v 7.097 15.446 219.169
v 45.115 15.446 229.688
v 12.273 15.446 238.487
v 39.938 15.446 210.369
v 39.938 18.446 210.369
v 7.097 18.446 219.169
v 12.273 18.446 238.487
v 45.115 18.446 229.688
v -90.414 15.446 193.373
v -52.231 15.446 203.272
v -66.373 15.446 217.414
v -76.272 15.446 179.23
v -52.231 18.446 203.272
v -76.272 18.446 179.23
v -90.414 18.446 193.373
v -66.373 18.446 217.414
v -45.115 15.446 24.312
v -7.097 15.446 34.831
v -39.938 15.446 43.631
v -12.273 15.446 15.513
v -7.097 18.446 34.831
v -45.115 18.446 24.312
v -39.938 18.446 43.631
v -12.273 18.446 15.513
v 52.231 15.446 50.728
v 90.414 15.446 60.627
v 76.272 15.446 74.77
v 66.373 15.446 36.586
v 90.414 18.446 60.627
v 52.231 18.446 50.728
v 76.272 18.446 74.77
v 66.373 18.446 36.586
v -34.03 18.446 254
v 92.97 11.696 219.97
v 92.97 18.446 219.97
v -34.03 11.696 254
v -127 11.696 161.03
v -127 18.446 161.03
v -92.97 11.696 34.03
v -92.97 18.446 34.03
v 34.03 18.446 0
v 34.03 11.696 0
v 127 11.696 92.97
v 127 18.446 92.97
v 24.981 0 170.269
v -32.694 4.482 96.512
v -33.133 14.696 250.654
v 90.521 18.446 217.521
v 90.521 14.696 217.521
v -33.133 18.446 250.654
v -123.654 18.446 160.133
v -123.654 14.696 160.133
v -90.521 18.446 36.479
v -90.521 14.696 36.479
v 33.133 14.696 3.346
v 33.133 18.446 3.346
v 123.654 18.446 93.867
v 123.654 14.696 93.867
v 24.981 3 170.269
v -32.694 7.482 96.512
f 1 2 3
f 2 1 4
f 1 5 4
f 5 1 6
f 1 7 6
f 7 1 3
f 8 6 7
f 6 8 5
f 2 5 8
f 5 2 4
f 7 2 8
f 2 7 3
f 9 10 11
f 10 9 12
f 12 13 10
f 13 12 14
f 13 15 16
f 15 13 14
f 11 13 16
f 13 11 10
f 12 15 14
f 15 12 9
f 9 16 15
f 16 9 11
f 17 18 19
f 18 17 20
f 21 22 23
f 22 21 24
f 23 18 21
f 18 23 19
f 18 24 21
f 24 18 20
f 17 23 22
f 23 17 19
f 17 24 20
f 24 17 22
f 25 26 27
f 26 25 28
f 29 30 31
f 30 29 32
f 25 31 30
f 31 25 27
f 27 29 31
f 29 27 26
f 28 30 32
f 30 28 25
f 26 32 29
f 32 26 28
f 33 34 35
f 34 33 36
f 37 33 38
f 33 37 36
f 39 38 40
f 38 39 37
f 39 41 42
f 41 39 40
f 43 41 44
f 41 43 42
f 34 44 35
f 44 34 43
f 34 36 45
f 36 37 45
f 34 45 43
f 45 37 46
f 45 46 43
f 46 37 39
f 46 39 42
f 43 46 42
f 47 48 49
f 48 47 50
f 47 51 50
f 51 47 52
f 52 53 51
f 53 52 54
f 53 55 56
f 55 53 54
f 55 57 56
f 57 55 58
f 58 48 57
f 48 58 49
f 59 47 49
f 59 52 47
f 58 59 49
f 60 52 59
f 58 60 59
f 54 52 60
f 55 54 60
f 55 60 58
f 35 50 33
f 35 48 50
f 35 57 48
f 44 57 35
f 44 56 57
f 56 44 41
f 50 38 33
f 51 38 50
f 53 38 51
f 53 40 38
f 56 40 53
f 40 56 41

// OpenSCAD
/*
    parametric_faceted_hex_wall_tile_mount_v23_10x10_vertical.scad
    ----------------------------------------------------------------
    Regular asymmetric low-poly hex wall tile.

    v23 goals
    ---------
    1. Exact 10.00" x 10.00" finished face bounding box by default.
    2. Preserve a TRUE regular hexagon -- no X/Y stretching.
    3. Vertical-print-first export option:
       - model can export standing on one edge
       - finished wall geometry is unchanged
    4. Open back remains fully open.
    5. Hidden mounting pads remain clipped below the visible face.
    6. One master thickness controls shell, perimeter, and pads.
    7. Optional breakaway vertical-print feet are available but OFF by default.

    Recommended default
    -------------------
    face_size_reference      = "bounding_square";
    face_size_units          = "mm";
    face_size                = 254.0;   // exact 10" x 10" envelope
    tile_rotation_deg        = 15;      // makes regular-hex X/Y envelope equal

    export_orientation       = "vertical";
    vertical_edge_angle_deg  = 0;

    master_thickness_mm      = 3.0;
    add_mount_pads           = true;
    add_mount_ribs           = false;

    Export
    ------
    F6 Render
    File -> Export -> Export as STL
*/


// =============================================================================
// CUSTOMIZER PARAMETERS
// =============================================================================


/* [Finished Face Size] */

// "bounding_square"
//     face_size is the maximum X and Y envelope.
//     At the default 15-degree rotation, a regular hex fills the square exactly.
//
// "flat_to_flat"
//     face_size is the traditional hex flat-to-flat dimension.
//
// "across_corners"
//     face_size is the regular-hex corner-to-corner dimension.
face_size_reference = "bounding_square"; // [bounding_square, flat_to_flat, across_corners]

// Units used by face_size.
face_size_units = "mm";                   // [mm, in]

// Default = exact 10.00 inches.
face_size = 254.0;

// Rotation of the finished hex within its face plane.
//
// IMPORTANT:
// 15 degrees gives a regular hex an equal X/Y bounding envelope.
// With bounding_square + 254 mm this produces approximately:
//     X = 254.0 mm
//     Y = 254.0 mm
tile_rotation_deg = 15;


/* [Export / Print Orientation] */

// "flat"     = conventional CAD orientation; decorative face points +Z.
// "vertical" = rotate final part onto an edge for vertical printing.
export_orientation = "vertical";          // [flat, vertical]

// Additional in-plane rotation used ONLY before standing the part vertically.
//
// Keep 0 for the default v23 geometry. The transformed model is automatically
// moved so its lowest point rests at Z=0.
vertical_edge_angle_deg = 0;

// Add small breakaway stabilizer feet after the model is stood vertically.
// Normally leave OFF and use a slicer brim if required.
add_vertical_breakaway_feet = false;

// Breakaway-foot dimensions.
vertical_foot_length_mm = 20.0;
vertical_foot_depth_mm = 8.0;
vertical_foot_height_mm = 0.60;
vertical_foot_neck_mm = 0.80;


/* [MASTER THICKNESS] */

// Main material thickness control.
master_thickness_mm = 3.0;

// Optional tuning multipliers.
front_shell_multiplier = 1.0;
perimeter_multiplier   = 1.0;
mount_pad_multiplier   = 1.0;


/* [Front Relief] */

// "proportional" scales relief with the true flat-to-flat dimension.
// "absolute" uses explicit millimeter values.
relief_height_mode = "proportional";      // [proportional, absolute]

relief_scale = 1.0;

// Relative relief proportions.
peak_height_ratio = 0.081;
ridge_to_peak_ratio = 0.757;
edge_to_peak_ratio = 0.097;

// Used only in absolute mode.
peak_height_mm   = 18.5;
ridge_height_mm = 14.0;
edge_height_mm  = 1.8;

// Minimum air gap between inner roof and mounting geometry.
edge_clearance_mm = 0.60;


/* [Facet Layout] */

peak_angle_deg = 45;
peak_radius_ratio = 0.38;

ridge_angle_deg = 208;
ridge_radius_ratio = 0.34;


/* [Wall Mounting] */

add_mount_pads = true;

// Width parallel to local hex edge.
mount_pad_width_mm = 34.0;

// Radial depth into the cavity.
mount_pad_depth_mm = 24.0;

// Structural overlap beneath the inner perimeter shell.
mount_pad_overlap_mm = 4.0;

// Pull mounting geometry inward from the visible outside perimeter.
mount_pad_edge_inset_mm = 3.0;

// Clearance below underside of visible face.
mount_face_clearance_mm = 0.75;

// Mount-pad directions in the tile's local coordinate system.
mount_pad_angles = [60, 120, 240, 300];


/* [Mount Reinforcement] */

add_mount_ribs = false;

mount_rib_width_mm  = 3.0;
mount_rib_height_mm = 5.0;
mount_rib_depth_mm  = 8.0;


/* [Optional Screw Holes] */

add_pad_screw_holes = false;

pad_screw_hole_diameter_mm = 4.5;


/* [Advanced] */

polyhedron_convexity = 12;
screw_hole_fn = 40;

// Small numerical tolerance.
eps = 0.01;


// =============================================================================
// HELPERS
// =============================================================================

function polar(angle_deg, radius) =
    [
        radius * cos(angle_deg),
        radius * sin(angle_deg)
    ];

function hex_vertex_unrotated(i, radius) =
    [
        radius * cos(30 + i * 60),
        radius * sin(30 + i * 60)
    ];

function rotate2d(p, angle_deg) =
    [
        p[0] * cos(angle_deg) - p[1] * sin(angle_deg),
        p[0] * sin(angle_deg) + p[1] * cos(angle_deg)
    ];

function hex_vertex(i, radius) =
    rotate2d(
        hex_vertex_unrotated(i, radius),
        tile_rotation_deg
    );

// Half-width / half-height of a unit-circumradius rotated regular hex.
function unit_hex_half_x(rotation_deg) =
    max([
        for (i = [0 : 5])
            abs(
                cos(30 + i * 60 + rotation_deg)
            )
    ]);

function unit_hex_half_y(rotation_deg) =
    max([
        for (i = [0 : 5])
            abs(
                sin(30 + i * 60 + rotation_deg)
            )
    ]);

// Bounding box of a regular hex with circumradius r.
function hex_bbox_x(r, rotation_deg) =
    2 * r * unit_hex_half_x(rotation_deg);

function hex_bbox_y(r, rotation_deg) =
    2 * r * unit_hex_half_y(rotation_deg);


// =============================================================================
// DERIVED MATERIAL THICKNESSES
// =============================================================================

front_shell_thickness_mm =
    master_thickness_mm * front_shell_multiplier;

perimeter_wall_thickness_mm =
    master_thickness_mm * perimeter_multiplier;

mount_pad_thickness_mm =
    master_thickness_mm * mount_pad_multiplier;


// =============================================================================
// DERIVED FACE DIMENSIONS
// =============================================================================

_face_size_mm =
    face_size_units == "in"
        ? face_size * 25.4
        : face_size;

// If bounding_square is selected, choose the largest regular-hex radius that
// fits inside both the requested X and Y dimensions.
//
// At tile_rotation_deg = 15, unit X and Y extents are equal, so both dimensions
// become exactly face_size.
r_outer =
    face_size_reference == "flat_to_flat"
        ? (_face_size_mm / 2) / cos(30)
        : face_size_reference == "across_corners"
            ? _face_size_mm / 2
            : min(
                _face_size_mm / (2 * unit_hex_half_x(tile_rotation_deg)),
                _face_size_mm / (2 * unit_hex_half_y(tile_rotation_deg))
              );

tile_flat_to_flat =
    2 * r_outer * cos(30);

tile_across_corners =
    2 * r_outer;

finished_bbox_x =
    hex_bbox_x(r_outer, tile_rotation_deg);

finished_bbox_y =
    hex_bbox_y(r_outer, tile_rotation_deg);

outer_apothem =
    tile_flat_to_flat / 2;

inner_apothem =
    outer_apothem - perimeter_wall_thickness_mm;

r_inner =
    inner_apothem / cos(30);

inner_flat_length =
    2 * inner_apothem * tan(30);

hex_side_length =
    r_outer;


// =============================================================================
// DERIVED RELIEF HEIGHTS
// =============================================================================

_peak_unscaled =
    relief_height_mode == "proportional"
        ? tile_flat_to_flat * peak_height_ratio
        : peak_height_mm;

_ridge_unscaled =
    relief_height_mode == "proportional"
        ? _peak_unscaled * ridge_to_peak_ratio
        : ridge_height_mm;

_requested_edge_unscaled =
    relief_height_mode == "proportional"
        ? _peak_unscaled * edge_to_peak_ratio
        : edge_height_mm;

peak_height =
    _peak_unscaled * relief_scale;

ridge_height =
    _ridge_unscaled * relief_scale;

requested_edge_height =
    _requested_edge_unscaled * relief_scale;

// Enough vertical room for front shell + complete pad + clearance.
minimum_edge_height =
    front_shell_thickness_mm
    + mount_pad_thickness_mm
    + mount_face_clearance_mm;

edge_height =
    max(
        requested_edge_height,
        minimum_edge_height
    );


// =============================================================================
// DERIVED MOUNTING GEOMETRY
// =============================================================================

mount_pad_desired_outer_r =
    inner_apothem + mount_pad_overlap_mm;

mount_pad_inner_r =
    mount_pad_desired_outer_r - mount_pad_depth_mm;

mount_pad_center_r =
    mount_pad_desired_outer_r - mount_pad_depth_mm / 2;

mount_clip_apothem =
    outer_apothem - mount_pad_edge_inset_mm;

mount_clip_radius =
    mount_clip_apothem / cos(30);


// =============================================================================
// VERTICAL-EXPORT DERIVED VALUES
// =============================================================================
//
// The tile is first rotated around Z by vertical_edge_angle_deg, then stood up
// by +90 degrees around X.
//
// We calculate the local Y envelope AFTER that optional Z rotation so the
// final model can be translated to put its lowest point exactly on Z=0.

vertical_rotation_total_deg =
    vertical_edge_angle_deg;

vertical_half_y =
    max([
        for (i = [0 : 5])
            abs(
                r_outer
                * sin(
                    30
                    + i * 60
                    + tile_rotation_deg
                    + vertical_rotation_total_deg
                )
            )
    ]);

vertical_print_height =
    2 * vertical_half_y;

// After rotate([90,0,0]), original +Z becomes -Y.
// Translate by peak_height so all relief lies in positive Y.
vertical_print_depth =
    peak_height;


// =============================================================================
// VALIDATION
// =============================================================================

assert(
    _face_size_mm > 0,
    "face_size must produce a positive dimension."
);

assert(
    master_thickness_mm > 0,
    "master_thickness_mm must be greater than zero."
);

assert(
    front_shell_multiplier > 0
    && perimeter_multiplier > 0
    && mount_pad_multiplier > 0,
    "All thickness multipliers must be greater than zero."
);

assert(
    front_shell_thickness_mm > 0,
    "front_shell_thickness_mm must be greater than zero."
);

assert(
    perimeter_wall_thickness_mm > 0,
    "perimeter_wall_thickness_mm must be greater than zero."
);

assert(
    perimeter_wall_thickness_mm < outer_apothem,
    "perimeter_wall_thickness_mm is too large for this tile."
);

assert(
    inner_apothem > 0,
    "The selected perimeter wall leaves no hollow interior."
);

assert(
    edge_height > front_shell_thickness_mm,
    "Internal error: edge_height must exceed front_shell_thickness_mm."
);

assert(
    ridge_height > edge_height,
    "ridge_height must remain greater than the effective edge height."
);

assert(
    peak_height > ridge_height,
    "peak_height must remain greater than ridge_height."
);

assert(
    peak_radius_ratio > 0 && peak_radius_ratio < 0.90,
    "peak_radius_ratio must be between 0 and 0.90."
);

assert(
    ridge_radius_ratio > 0 && ridge_radius_ratio < 0.90,
    "ridge_radius_ratio must be between 0 and 0.90."
);

assert(
    mount_pad_width_mm > 0,
    "mount_pad_width_mm must be greater than zero."
);

assert(
    mount_pad_depth_mm > 0,
    "mount_pad_depth_mm must be greater than zero."
);

assert(
    mount_pad_thickness_mm > 0,
    "mount_pad_thickness_mm must be greater than zero."
);

assert(
    mount_pad_overlap_mm >= 0,
    "mount_pad_overlap_mm cannot be negative."
);

assert(
    mount_pad_edge_inset_mm >= 0,
    "mount_pad_edge_inset_mm cannot be negative."
);

assert(
    mount_face_clearance_mm >= 0,
    "mount_face_clearance_mm cannot be negative."
);

assert(
    mount_clip_apothem > 0,
    "mount_pad_edge_inset_mm is too large."
);

assert(
    mount_pad_inner_r > 0,
    "mount_pad_depth_mm is too large and reaches/passes the tile center."
);

assert(
    !add_pad_screw_holes
    || pad_screw_hole_diameter_mm < mount_pad_width_mm * 0.75,
    "pad_screw_hole_diameter_mm is too large for the mounting pad."
);

assert(
    !add_mount_ribs
    || mount_rib_height_mm > 0,
    "mount_rib_height_mm must be greater than zero."
);

assert(
    !add_vertical_breakaway_feet
    || export_orientation == "vertical",
    "Vertical breakaway feet require export_orientation = \"vertical\"."
);


// =============================================================================
// DIAGNOSTIC OUTPUT
// =============================================================================

echo("====================================================");
echo("FACETED HEX WALL TILE v23 - 10x10 / VERTICAL");
echo("====================================================");

echo(str("face size reference      : ", face_size_reference));
echo(str("requested face size      : ", _face_size_mm, " mm"));
echo(str("tile rotation            : ", tile_rotation_deg, " deg"));

echo(str("finished bbox X          : ", finished_bbox_x, " mm"));
echo(str("finished bbox Y          : ", finished_bbox_y, " mm"));
echo(str("finished bbox X inches   : ", finished_bbox_x / 25.4, " in"));
echo(str("finished bbox Y inches   : ", finished_bbox_y / 25.4, " in"));

echo(str("flat-to-flat             : ", tile_flat_to_flat, " mm"));
echo(str("across-corners           : ", tile_across_corners, " mm"));
echo(str("hex side length          : ", hex_side_length, " mm"));

echo(str("MASTER thickness         : ", master_thickness_mm, " mm"));
echo(str("actual front shell       : ", front_shell_thickness_mm, " mm"));
echo(str("actual perimeter wall    : ", perimeter_wall_thickness_mm, " mm"));
echo(str("actual mount pad         : ", mount_pad_thickness_mm, " mm"));

echo(str("requested edge height    : ", requested_edge_height, " mm"));
echo(str("minimum edge height      : ", minimum_edge_height, " mm"));
echo(str("EFFECTIVE edge height    : ", edge_height, " mm"));

echo(str("ridge height             : ", ridge_height, " mm"));
echo(str("peak height              : ", peak_height, " mm"));
echo(str("peak height inches       : ", peak_height / 25.4, " in"));

echo(str("mount pad width          : ", mount_pad_width_mm, " mm"));
echo(str("mount pad depth          : ", mount_pad_depth_mm, " mm"));
echo(str("mount pad thickness      : ", mount_pad_thickness_mm, " mm"));
echo(str("mount pad overlap        : ", mount_pad_overlap_mm, " mm"));
echo(str("mount edge inset         : ", mount_pad_edge_inset_mm, " mm"));
echo(str("mount/face clearance     : ", mount_face_clearance_mm, " mm"));

echo(str("export orientation       : ", export_orientation));

if (export_orientation == "vertical") {
    echo(str("vertical print height    : ", vertical_print_height, " mm"));
    echo(str("vertical print depth     : ", vertical_print_depth, " mm"));
}

if (edge_height > requested_edge_height)
    echo(
        str(
            "AUTO EDGE FIX ACTIVE: edge raised from ",
            requested_edge_height,
            " mm to ",
            edge_height,
            " mm."
        )
    );

echo("====================================================");


// =============================================================================
// FRONT RELIEF CONTROL POINTS
// =============================================================================

P_xy =
    polar(
        peak_angle_deg + tile_rotation_deg,
        r_outer * peak_radius_ratio
    );

Q_xy =
    polar(
        ridge_angle_deg + tile_rotation_deg,
        r_outer * ridge_radius_ratio
    );


// =============================================================================
// SHELL VERTICES
// =============================================================================

points =
    concat(

        // 0..5 : outer rear perimeter
        [
            for (i = [0 : 5])
                let(p = hex_vertex(i, r_outer))
                [p[0], p[1], 0]
        ],

        // 6..11 : outer front perimeter
        [
            for (i = [0 : 5])
                let(p = hex_vertex(i, r_outer))
                [p[0], p[1], edge_height]
        ],

        // 12..13 : outer peak / ridge
        [
            [P_xy[0], P_xy[1], peak_height],
            [Q_xy[0], Q_xy[1], ridge_height]
        ],

        // 14..19 : inner rear perimeter
        [
            for (i = [0 : 5])
                let(p = hex_vertex(i, r_inner))
                [p[0], p[1], 0]
        ],

        // 20..25 : inner front perimeter
        [
            for (i = [0 : 5])
                let(p = hex_vertex(i, r_inner))
                [p[0], p[1], edge_height - front_shell_thickness_mm]
        ],

        // 26..27 : inner peak / ridge
        [
            [
                P_xy[0],
                P_xy[1],
                peak_height - front_shell_thickness_mm
            ],
            [
                Q_xy[0],
                Q_xy[1],
                ridge_height - front_shell_thickness_mm
            ]
        ]
    );


// =============================================================================
// SHELL FACES
// =============================================================================

outer_roof_faces = [
    [6, 7, 12],
    [7, 8, 12],
    [6, 12, 11],

    [8, 13, 12],
    [11, 12, 13],

    [8, 9, 13],
    [9, 10, 13],
    [10, 11, 13]
];

inner_roof_faces = [
    [26, 21, 20],
    [26, 22, 21],
    [25, 26, 20],

    [26, 27, 22],
    [27, 26, 25],

    [27, 23, 22],
    [27, 24, 23],
    [27, 25, 24]
];

faces =
    concat(

        // Outer vertical perimeter
        [
            for (i = [0 : 5])
                [
                    i,
                    (i + 1) % 6,
                    6 + (i + 1) % 6,
                    6 + i
                ]
        ],

        outer_roof_faces,

        // Inner vertical perimeter
        [
            for (i = [0 : 5])
                [
                    14 + i,
                    20 + i,
                    20 + (i + 1) % 6,
                    14 + (i + 1) % 6
                ]
        ],

        inner_roof_faces,

        // Narrow rear perimeter ring only.
        // Center remains fully open.
        [
            for (i = [0 : 5])
                [
                    i,
                    14 + i,
                    14 + (i + 1) % 6,
                    (i + 1) % 6
                ]
        ]
    );


// =============================================================================
// TILE SHELL
// =============================================================================

module tile_shell() {
    polyhedron(
        points = points,
        faces = faces,
        convexity = polyhedron_convexity
    );
}


// =============================================================================
// SAFE MOUNTING VOLUME BELOW FRONT FACE
// =============================================================================

safe_edge_z =
    max(
        eps,
        edge_height
        - front_shell_thickness_mm
        - mount_face_clearance_mm
    );

safe_peak_z =
    max(
        eps,
        peak_height
        - front_shell_thickness_mm
        - mount_face_clearance_mm
    );

safe_ridge_z =
    max(
        eps,
        ridge_height
        - front_shell_thickness_mm
        - mount_face_clearance_mm
    );

safe_mount_points =
    concat(

        // 0..5 : rear outer perimeter
        [
            for (i = [0 : 5])
                let(p = hex_vertex(i, r_outer))
                [p[0], p[1], 0]
        ],

        // 6..11 : safe ceiling at outer perimeter
        [
            for (i = [0 : 5])
                let(p = hex_vertex(i, r_outer))
                [p[0], p[1], safe_edge_z]
        ],

        // 12..13 : safe ceiling under peak/ridge
        [
            [P_xy[0], P_xy[1], safe_peak_z],
            [Q_xy[0], Q_xy[1], safe_ridge_z]
        ]
    );

safe_mount_ceiling_faces = [
    [6, 7, 12],
    [7, 8, 12],
    [6, 12, 11],
    [8, 13, 12],
    [11, 12, 13],
    [8, 9, 13],
    [9, 10, 13],
    [10, 11, 13]
];

safe_mount_faces =
    concat(

        // Outer side walls.
        [
            for (i = [0 : 5])
                [
                    i,
                    (i + 1) % 6,
                    6 + (i + 1) % 6,
                    6 + i
                ]
        ],

        // Sloped safe ceiling.
        safe_mount_ceiling_faces,

        // Rear floor used only to close clipping volume.
        [[5, 4, 3, 2, 1, 0]]
    );

module safe_mount_volume() {
    polyhedron(
        points = safe_mount_points,
        faces = safe_mount_faces,
        convexity = polyhedron_convexity
    );
}


// =============================================================================
// HEX FOOTPRINT FOR MOUNT CLIPPING
// =============================================================================

module mount_clip_volume(height_mm) {
    linear_extrude(height = height_mm)
        polygon(
            points = [
                for (i = [0 : 5])
                    hex_vertex(i, mount_clip_radius)
            ]
        );
}


// =============================================================================
// RAW MOUNT PAD
// =============================================================================
//
// Mount-pad angles are local tile angles. tile_rotation_deg is applied so the
// pads remain attached to the same visual positions when the face rotates.

module raw_mount_pad(angle_deg) {
    rotate([0, 0, angle_deg + tile_rotation_deg])
        translate(
            [
                mount_pad_inner_r,
                -mount_pad_width_mm / 2,
                0
            ]
        )
            cube(
                [
                    mount_pad_depth_mm,
                    mount_pad_width_mm,
                    mount_pad_thickness_mm
                ]
            );
}


// =============================================================================
// CLIPPED MOUNT PAD
// =============================================================================

module mount_pad(angle_deg) {
    intersection() {

        raw_mount_pad(angle_deg);

        // Keep pad inside inset hex footprint.
        mount_clip_volume(
            mount_pad_thickness_mm + eps
        );

        // Hard stop below underside of front shell.
        safe_mount_volume();
    }
}


// =============================================================================
// OPTIONAL REINFORCING RIBS
// =============================================================================

module raw_mount_ribs(angle_deg) {

    rib_center_r =
        mount_pad_desired_outer_r
        - mount_rib_depth_mm / 2;

    rib_side_offset =
        max(
            0,
            mount_pad_width_mm / 2
            - mount_rib_width_mm
            - 2
        );

    rotate([0, 0, angle_deg + tile_rotation_deg]) {

        for (side = [-1, 1]) {

            translate(
                [
                    rib_center_r - mount_rib_depth_mm / 2,
                    side * rib_side_offset - mount_rib_width_mm / 2,
                    mount_pad_thickness_mm
                ]
            )

            rotate([90, 0, 90])

            linear_extrude(height = mount_rib_depth_mm)

            polygon(
                points = [
                    [0, 0],
                    [mount_rib_width_mm, 0],
                    [mount_rib_width_mm, mount_rib_height_mm],
                    [0, 0]
                ]
            );
        }
    }
}

module mount_ribs(angle_deg) {
    intersection() {

        raw_mount_ribs(angle_deg);

        mount_clip_volume(
            mount_pad_thickness_mm
            + mount_rib_height_mm
            + 0.1
        );

        safe_mount_volume();
    }
}


// =============================================================================
// OPTIONAL SCREW HOLE
// =============================================================================

module pad_screw_hole(angle_deg) {

    rotate([0, 0, angle_deg + tile_rotation_deg])

        translate(
            [
                mount_pad_center_r,
                0,
                -1
            ]
        )

            cylinder(
                d = pad_screw_hole_diameter_mm,
                h =
                    mount_pad_thickness_mm
                    + mount_rib_height_mm
                    + 2,
                $fn = screw_hole_fn
            );
}


// =============================================================================
// COMPLETE FINISHED TILE
// =============================================================================

module finished_tile() {

    difference() {

        union() {

            tile_shell();

            if (add_mount_pads) {

                for (a = mount_pad_angles) {

                    mount_pad(a);

                    if (add_mount_ribs)
                        mount_ribs(a);
                }
            }
        }

        if (
            add_mount_pads
            && add_pad_screw_holes
        ) {

            for (a = mount_pad_angles)
                pad_screw_hole(a);
        }
    }
}


// =============================================================================
// VERTICAL-PRINT TRANSFORM
// =============================================================================
//
// Transform order in OpenSCAD is inside-out:
//
// 1. finished_tile()
// 2. optional extra Z rotation for selecting another edge
// 3. rotate +90 degrees around X so the face stands vertically
// 4. translate so:
//      - relief depth occupies positive Y
//      - lowest tile point is exactly at Z=0

module vertical_tile() {

    translate(
        [
            0,
            peak_height,
            vertical_half_y
        ]
    )

    rotate([90, 0, 0])

    rotate([0, 0, vertical_edge_angle_deg])

        finished_tile();
}


// =============================================================================
// OPTIONAL BREAKAWAY VERTICAL FEET
// =============================================================================
//
// These are intentionally simple sacrificial tabs.
// They are added only in vertical export mode.
// Leave OFF unless a brim alone is not sufficient.

module vertical_breakaway_feet() {

    // Two feet spread across X.
    foot_x =
        finished_bbox_x * 0.28;

    for (x = [-foot_x, foot_x]) {

        // Main foot.
        translate(
            [
                x - vertical_foot_length_mm / 2,
                0,
                0
            ]
        )
            cube(
                [
                    vertical_foot_length_mm,
                    vertical_foot_depth_mm,
                    vertical_foot_height_mm
                ]
            );

        // Narrow neck connecting foot to the tile plane.
        translate(
            [
                x - vertical_foot_neck_mm / 2,
                vertical_foot_depth_mm - vertical_foot_neck_mm,
                0
            ]
        )
            cube(
                [
                    vertical_foot_neck_mm,
                    vertical_foot_neck_mm,
                    min(edge_height, 3.0)
                ]
            );
    }
}


// =============================================================================
// OUTPUT
// =============================================================================

module output_model() {

    if (export_orientation == "vertical") {

        union() {

            vertical_tile();

            if (add_vertical_breakaway_feet)
                vertical_breakaway_feet();
        }

    } else {

        finished_tile();
    }
}

output_model();
